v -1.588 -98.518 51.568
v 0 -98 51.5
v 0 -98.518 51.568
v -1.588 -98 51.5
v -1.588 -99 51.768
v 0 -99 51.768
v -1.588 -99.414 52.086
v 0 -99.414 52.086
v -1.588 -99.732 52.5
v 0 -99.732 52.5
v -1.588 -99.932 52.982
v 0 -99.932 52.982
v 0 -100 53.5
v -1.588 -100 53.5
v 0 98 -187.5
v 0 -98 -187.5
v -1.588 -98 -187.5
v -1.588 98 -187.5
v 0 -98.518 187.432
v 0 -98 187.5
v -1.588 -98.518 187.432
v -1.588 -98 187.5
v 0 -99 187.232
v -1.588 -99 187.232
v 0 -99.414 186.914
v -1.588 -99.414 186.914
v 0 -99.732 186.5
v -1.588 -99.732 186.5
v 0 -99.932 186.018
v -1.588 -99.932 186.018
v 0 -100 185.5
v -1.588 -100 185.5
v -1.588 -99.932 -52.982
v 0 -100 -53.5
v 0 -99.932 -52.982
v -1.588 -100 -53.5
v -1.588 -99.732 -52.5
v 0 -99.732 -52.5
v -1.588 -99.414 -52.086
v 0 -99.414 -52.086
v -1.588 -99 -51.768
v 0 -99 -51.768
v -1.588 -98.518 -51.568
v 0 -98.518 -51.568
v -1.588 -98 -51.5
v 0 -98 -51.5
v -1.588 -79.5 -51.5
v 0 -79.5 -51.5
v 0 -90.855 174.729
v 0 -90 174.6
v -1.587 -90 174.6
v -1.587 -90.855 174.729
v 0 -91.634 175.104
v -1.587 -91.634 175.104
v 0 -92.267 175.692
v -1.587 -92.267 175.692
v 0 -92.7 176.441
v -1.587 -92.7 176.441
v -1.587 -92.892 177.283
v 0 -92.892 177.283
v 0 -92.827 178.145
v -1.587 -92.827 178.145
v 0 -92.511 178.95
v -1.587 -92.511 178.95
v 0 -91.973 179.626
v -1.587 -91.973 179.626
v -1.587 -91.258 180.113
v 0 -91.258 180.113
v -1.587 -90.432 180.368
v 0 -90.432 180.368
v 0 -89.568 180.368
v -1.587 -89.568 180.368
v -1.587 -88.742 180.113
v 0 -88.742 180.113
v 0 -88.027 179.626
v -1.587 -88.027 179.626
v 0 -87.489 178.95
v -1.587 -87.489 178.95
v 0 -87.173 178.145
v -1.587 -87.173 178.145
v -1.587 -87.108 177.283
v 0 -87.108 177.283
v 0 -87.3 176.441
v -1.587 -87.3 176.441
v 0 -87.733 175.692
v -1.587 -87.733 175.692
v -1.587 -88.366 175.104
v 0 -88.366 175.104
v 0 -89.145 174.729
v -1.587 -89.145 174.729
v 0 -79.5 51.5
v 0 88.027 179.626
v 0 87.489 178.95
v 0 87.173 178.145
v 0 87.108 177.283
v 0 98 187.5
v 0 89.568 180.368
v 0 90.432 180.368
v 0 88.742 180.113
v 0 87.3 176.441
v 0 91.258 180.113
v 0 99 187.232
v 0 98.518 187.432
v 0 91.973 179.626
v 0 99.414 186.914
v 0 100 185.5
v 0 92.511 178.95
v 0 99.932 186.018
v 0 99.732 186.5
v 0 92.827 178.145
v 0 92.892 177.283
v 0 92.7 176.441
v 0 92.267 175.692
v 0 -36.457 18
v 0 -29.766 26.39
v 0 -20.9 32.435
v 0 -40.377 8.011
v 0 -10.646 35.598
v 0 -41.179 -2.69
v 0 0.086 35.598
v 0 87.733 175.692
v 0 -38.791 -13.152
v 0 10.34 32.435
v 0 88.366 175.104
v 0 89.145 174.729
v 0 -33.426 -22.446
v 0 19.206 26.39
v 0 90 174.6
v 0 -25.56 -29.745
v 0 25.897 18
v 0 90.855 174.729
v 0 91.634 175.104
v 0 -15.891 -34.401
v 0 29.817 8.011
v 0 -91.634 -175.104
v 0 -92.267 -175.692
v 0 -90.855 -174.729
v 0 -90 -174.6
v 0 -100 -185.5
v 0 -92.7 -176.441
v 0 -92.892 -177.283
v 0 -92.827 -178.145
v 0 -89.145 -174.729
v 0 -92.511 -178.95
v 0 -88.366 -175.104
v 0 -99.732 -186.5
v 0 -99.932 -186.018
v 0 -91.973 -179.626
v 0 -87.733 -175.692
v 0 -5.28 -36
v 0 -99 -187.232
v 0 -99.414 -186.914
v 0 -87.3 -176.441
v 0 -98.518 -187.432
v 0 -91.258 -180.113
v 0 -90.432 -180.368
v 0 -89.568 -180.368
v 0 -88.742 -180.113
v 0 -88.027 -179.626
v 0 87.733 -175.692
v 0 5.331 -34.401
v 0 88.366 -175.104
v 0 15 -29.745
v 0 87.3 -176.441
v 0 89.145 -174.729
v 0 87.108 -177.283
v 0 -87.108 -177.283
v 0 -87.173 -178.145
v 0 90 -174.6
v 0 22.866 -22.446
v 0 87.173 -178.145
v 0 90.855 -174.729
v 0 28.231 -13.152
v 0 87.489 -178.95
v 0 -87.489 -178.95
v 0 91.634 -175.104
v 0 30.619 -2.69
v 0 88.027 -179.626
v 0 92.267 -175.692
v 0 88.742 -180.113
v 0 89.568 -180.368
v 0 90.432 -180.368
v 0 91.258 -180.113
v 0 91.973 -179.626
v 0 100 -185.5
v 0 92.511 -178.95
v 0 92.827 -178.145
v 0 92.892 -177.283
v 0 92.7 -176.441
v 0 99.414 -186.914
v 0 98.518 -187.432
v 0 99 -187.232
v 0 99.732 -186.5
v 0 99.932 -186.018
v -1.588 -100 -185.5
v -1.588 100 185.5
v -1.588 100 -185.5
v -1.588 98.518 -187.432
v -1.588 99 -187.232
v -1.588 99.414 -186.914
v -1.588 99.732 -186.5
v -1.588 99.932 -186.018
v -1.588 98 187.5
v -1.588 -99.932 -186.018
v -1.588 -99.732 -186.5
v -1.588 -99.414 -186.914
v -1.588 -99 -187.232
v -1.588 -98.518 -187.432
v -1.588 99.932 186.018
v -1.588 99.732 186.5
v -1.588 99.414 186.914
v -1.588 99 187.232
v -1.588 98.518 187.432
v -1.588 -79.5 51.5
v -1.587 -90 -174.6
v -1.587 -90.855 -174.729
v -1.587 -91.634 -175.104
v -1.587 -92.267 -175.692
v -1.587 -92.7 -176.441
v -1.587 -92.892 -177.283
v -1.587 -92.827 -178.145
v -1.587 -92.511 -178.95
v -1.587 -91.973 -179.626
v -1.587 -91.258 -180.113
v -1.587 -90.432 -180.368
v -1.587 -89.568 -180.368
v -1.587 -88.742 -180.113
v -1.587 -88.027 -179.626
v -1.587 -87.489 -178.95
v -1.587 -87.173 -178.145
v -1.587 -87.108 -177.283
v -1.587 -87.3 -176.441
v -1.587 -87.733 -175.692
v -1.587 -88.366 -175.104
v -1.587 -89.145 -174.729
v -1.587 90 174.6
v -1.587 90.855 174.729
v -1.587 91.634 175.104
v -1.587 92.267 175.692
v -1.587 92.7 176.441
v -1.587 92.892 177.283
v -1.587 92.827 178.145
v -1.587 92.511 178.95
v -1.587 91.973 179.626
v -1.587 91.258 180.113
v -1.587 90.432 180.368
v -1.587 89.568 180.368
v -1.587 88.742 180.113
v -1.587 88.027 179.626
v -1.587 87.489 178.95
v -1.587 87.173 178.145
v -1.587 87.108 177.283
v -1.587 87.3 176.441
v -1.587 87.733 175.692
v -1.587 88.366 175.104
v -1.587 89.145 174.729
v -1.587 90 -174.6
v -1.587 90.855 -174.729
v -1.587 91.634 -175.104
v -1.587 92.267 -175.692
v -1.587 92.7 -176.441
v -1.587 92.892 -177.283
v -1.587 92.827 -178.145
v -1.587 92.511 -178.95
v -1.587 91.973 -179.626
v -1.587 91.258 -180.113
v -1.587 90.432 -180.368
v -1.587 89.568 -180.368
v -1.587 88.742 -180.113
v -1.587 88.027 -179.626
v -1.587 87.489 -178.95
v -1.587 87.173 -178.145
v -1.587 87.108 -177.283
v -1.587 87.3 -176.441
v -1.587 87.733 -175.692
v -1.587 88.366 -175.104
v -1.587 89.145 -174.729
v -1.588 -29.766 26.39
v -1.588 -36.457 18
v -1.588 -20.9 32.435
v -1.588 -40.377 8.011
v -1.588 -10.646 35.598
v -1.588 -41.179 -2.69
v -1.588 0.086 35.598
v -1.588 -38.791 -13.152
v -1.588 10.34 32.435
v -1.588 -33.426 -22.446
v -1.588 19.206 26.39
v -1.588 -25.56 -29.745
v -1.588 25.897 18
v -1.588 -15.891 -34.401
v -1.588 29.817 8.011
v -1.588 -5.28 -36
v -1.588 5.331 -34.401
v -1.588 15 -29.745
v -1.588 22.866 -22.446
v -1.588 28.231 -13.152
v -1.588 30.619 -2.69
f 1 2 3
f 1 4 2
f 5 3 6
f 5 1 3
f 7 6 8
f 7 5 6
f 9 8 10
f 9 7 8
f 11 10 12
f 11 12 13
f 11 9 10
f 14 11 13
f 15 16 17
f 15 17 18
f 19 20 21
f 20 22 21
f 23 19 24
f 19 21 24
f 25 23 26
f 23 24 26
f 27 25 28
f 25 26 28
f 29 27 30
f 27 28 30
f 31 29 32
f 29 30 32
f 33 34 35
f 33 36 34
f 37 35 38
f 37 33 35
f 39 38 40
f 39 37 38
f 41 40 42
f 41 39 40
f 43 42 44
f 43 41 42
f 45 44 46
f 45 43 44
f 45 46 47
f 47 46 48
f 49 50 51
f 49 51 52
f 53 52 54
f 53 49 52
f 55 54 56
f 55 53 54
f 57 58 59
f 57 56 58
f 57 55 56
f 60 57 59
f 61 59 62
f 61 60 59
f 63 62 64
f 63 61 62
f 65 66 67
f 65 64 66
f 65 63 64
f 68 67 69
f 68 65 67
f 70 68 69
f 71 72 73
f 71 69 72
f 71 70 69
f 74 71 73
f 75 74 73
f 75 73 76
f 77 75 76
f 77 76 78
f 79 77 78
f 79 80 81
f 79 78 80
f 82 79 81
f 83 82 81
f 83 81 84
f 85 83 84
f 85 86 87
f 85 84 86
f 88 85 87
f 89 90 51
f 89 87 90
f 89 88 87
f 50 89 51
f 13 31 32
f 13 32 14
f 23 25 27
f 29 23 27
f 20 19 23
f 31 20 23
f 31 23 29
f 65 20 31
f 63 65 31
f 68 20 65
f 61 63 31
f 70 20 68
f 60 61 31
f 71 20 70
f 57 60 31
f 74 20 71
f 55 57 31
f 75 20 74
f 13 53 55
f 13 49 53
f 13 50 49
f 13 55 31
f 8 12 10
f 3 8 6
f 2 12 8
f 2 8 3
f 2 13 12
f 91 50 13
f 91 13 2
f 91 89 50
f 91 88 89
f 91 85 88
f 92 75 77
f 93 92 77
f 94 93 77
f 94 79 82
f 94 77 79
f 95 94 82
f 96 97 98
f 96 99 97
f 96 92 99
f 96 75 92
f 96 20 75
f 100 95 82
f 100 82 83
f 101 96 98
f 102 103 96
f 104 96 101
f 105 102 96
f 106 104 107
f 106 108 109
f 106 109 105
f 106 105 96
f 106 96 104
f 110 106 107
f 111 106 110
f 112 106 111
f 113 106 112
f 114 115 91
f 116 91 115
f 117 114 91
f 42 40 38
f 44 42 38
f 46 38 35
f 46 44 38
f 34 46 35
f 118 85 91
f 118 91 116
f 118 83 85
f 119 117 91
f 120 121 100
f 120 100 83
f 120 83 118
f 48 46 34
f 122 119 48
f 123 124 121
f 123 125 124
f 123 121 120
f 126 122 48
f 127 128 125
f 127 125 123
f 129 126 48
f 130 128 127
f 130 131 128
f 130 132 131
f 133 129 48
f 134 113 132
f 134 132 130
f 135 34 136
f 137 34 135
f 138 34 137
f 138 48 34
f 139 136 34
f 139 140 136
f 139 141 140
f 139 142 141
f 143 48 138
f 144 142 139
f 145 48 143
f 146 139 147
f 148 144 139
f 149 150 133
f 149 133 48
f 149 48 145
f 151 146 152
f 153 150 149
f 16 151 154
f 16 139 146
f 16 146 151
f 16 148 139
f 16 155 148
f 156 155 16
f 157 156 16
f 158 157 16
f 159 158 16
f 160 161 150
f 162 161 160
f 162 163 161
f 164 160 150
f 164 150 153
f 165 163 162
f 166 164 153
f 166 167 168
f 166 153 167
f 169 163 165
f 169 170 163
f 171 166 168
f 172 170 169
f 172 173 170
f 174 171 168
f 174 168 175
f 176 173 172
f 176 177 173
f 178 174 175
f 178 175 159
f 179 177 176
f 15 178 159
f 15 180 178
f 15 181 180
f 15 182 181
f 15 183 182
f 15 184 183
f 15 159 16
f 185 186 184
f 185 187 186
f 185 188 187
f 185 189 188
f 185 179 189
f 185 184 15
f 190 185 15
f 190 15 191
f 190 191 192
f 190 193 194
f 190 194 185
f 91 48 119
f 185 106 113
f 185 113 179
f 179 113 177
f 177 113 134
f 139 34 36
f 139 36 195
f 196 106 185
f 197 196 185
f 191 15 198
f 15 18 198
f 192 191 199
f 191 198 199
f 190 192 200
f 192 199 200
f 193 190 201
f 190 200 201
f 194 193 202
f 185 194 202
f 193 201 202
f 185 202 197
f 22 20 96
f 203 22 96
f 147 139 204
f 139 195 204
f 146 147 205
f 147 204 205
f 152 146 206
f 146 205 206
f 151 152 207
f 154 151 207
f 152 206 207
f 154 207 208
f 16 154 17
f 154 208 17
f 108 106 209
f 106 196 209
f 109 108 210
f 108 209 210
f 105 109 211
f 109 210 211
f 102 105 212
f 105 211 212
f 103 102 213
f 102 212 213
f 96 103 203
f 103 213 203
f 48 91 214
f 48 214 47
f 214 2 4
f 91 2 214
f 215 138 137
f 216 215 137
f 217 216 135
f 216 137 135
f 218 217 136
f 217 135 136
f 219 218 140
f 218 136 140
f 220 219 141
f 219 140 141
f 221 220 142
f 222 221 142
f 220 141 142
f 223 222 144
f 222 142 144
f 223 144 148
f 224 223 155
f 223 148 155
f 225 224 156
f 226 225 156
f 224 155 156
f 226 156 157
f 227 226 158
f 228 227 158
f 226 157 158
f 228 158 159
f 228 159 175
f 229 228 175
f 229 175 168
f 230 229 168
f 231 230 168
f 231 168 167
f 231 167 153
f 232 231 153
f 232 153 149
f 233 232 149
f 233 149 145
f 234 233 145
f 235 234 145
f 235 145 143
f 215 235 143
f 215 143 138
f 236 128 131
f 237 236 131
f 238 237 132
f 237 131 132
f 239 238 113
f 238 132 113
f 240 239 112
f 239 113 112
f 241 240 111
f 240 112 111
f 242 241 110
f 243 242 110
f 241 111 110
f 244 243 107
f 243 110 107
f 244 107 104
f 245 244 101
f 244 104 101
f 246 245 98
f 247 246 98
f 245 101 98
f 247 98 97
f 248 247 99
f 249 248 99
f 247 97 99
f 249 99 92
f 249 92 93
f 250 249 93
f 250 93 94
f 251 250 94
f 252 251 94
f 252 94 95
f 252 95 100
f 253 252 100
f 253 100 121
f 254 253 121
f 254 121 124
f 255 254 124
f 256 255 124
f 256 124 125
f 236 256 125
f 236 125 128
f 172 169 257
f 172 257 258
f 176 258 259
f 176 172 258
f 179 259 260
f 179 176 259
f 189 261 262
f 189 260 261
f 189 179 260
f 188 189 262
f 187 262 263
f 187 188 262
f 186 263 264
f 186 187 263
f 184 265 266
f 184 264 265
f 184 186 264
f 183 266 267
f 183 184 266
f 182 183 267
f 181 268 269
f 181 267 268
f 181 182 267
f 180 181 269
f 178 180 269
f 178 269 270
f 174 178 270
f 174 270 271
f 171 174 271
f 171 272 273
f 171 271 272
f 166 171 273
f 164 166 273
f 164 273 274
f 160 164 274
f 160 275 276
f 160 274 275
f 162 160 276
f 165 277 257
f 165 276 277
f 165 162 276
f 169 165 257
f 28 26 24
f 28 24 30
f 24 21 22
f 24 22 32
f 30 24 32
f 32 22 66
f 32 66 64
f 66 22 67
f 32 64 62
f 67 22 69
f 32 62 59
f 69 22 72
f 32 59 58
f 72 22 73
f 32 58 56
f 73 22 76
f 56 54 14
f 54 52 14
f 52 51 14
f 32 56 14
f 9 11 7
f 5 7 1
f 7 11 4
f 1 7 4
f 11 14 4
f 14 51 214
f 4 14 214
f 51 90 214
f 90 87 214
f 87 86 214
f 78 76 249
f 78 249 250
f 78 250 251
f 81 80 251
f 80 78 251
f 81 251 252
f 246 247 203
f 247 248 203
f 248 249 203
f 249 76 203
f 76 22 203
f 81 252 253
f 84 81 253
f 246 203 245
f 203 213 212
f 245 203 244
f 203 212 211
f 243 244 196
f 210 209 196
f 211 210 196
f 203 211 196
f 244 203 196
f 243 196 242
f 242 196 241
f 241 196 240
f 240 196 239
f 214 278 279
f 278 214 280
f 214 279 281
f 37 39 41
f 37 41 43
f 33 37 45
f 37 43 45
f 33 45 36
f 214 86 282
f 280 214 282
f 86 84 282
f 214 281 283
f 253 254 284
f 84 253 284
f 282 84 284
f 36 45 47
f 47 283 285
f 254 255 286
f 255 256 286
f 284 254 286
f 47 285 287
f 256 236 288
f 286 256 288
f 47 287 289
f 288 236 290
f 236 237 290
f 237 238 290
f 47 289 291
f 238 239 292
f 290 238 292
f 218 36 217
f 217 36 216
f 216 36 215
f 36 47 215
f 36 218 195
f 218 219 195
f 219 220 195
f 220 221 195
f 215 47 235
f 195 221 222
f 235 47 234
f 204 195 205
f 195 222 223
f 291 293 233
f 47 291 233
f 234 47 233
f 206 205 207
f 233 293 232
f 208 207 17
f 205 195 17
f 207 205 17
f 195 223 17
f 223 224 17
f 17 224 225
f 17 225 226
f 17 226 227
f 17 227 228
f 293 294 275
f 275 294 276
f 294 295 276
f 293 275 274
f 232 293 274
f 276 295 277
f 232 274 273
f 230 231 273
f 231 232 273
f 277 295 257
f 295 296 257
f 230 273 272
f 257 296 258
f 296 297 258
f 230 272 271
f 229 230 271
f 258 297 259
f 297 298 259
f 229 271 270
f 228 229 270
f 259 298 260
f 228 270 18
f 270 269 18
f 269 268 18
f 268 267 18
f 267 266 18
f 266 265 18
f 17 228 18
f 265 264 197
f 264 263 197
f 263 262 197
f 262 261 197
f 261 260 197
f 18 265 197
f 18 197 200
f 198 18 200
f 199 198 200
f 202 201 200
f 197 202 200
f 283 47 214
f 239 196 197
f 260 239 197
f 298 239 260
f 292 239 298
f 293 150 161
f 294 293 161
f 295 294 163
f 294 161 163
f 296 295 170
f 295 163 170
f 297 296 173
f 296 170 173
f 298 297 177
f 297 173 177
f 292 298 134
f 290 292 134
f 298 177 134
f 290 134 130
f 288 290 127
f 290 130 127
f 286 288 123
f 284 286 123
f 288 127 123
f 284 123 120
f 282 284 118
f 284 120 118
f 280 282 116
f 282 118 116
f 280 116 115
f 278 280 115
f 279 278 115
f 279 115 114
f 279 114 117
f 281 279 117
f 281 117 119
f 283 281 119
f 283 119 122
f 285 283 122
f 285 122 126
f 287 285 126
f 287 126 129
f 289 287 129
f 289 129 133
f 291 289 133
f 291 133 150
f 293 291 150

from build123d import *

# Parameters (mm, degrees)
SKETCH1_W            = 375
SKETCH1_H            = 200
SKETCH1_R            = 20
BASE_FLANGE1_DEPTH   = 1.5875
M5_CLEARANCE_HOLE1_D = 5.8
MIRROR2_COPY_1_D     = 5.8
FILLET1_R            = 2
FILLET2_R            = 2
FILLET3_R            = 2
FILLET4_R            = 2
SKETCH9_W            = 103
SKETCH9_H            = 20.5
CUT_EXTRUDE1_DEPTH   = 10
FILLET5_R            = 2
FILLET6_R            = 2
SKETCH10_R           = 20
BOSS_EXTRUDE1_DEPTH  = 1.5875
SKETCH11_R           = 36
CUT_EXTRUDE2_DEPTH   = 10


# Sheet-metal steps are written as plain solids
with BuildPart() as part:
    # Sketch1 → Base-Flange1 (new body)
    with BuildSketch(Plane(origin=(0, 0, 0), x_dir=(0, 0, -1), z_dir=(1, 0, 0))):
        Rectangle(SKETCH1_W, SKETCH1_H)
        Circle(SKETCH1_R, mode=Mode.SUBTRACT)
    extrude(amount=-BASE_FLANGE1_DEPTH)

    # M5 Clearance Hole1 (through all)
    with Locations(Plane.ZY.offset(1.5875)):
        with Locations((177.5, 90)):
            m5_clearance_hole1 = Hole(M5_CLEARANCE_HOLE1_D / 2)

    # Mirror1: M5 Clearance Hole1 across plane
    add(m5_clearance_hole1.mirror(Plane.XY), mode=Mode.SUBTRACT)

    # Mirror2: M5 Clearance Hole1 across plane
    add(m5_clearance_hole1.mirror(Plane.ZX), mode=Mode.SUBTRACT)

    # Mirror2 copy 1 (through all)
    with Locations(Plane(origin=(-1.5875, 0, 0), x_dir=(0, 0, -1), z_dir=(-1, 0, 0))):
        with Locations((177.5, 90)):
            Hole(MIRROR2_COPY_1_D / 2)

    # Fillet1
    fillet1_edges = [part.edges().sort_by_distance(p)[0] for p in [
        (-0.79375, -100, -187.5),
    ]]
    fillet(fillet1_edges, radius=FILLET1_R)

    # Fillet2
    fillet2_edges = [part.edges().sort_by_distance(p)[0] for p in [
        (-0.79375, 100, -187.5),
    ]]
    fillet(fillet2_edges, radius=FILLET2_R)

    # Fillet3
    fillet3_edges = [part.edges().sort_by_distance(p)[0] for p in [
        (-0.79375, 100, 187.5),
    ]]
    fillet(fillet3_edges, radius=FILLET3_R)

    # Fillet4
    fillet4_edges = [part.edges().sort_by_distance(p)[0] for p in [
        (-0.79375, -100, 187.5),
    ]]
    fillet(fillet4_edges, radius=FILLET4_R)

    # Sketch9 → Cut-Extrude1 (cut)
    with BuildSketch(Plane(origin=(0, 0, 0), x_dir=(0, 0, -1), z_dir=(1, 0, 0))):
        with Locations((0, -89.75)):
            Rectangle(SKETCH9_W, SKETCH9_H)
    extrude(amount=-CUT_EXTRUDE1_DEPTH, mode=Mode.SUBTRACT)

    # Fillet5
    fillet5_edges = [part.edges().sort_by_distance(p)[0] for p in [
        (-0.79375, -100, -51.5),
    ]]
    fillet(fillet5_edges, radius=FILLET5_R)

    # Fillet6
    fillet6_edges = [part.edges().sort_by_distance(p)[0] for p in [
        (-0.79375, -100, 51.5),
    ]]
    fillet(fillet6_edges, radius=FILLET6_R)

    # Sketch10 → Boss-Extrude1 (add)
    with BuildSketch(Plane(origin=(0, 0, 0), x_dir=(0, 0, -1), z_dir=(1, 0, 0))):
        Circle(SKETCH10_R)
    extrude(amount=-BOSS_EXTRUDE1_DEPTH)

    # Sketch11 → Cut-Extrude2 (cut)
    with BuildSketch(Plane(origin=(0, 0, 0), x_dir=(0, 0, -1), z_dir=(1, 0, 0))):
        with Locations((0, -5.28)):
            Circle(SKETCH11_R)
    extrude(amount=-CUT_EXTRUDE2_DEPTH, mode=Mode.SUBTRACT)


solid = part.part
